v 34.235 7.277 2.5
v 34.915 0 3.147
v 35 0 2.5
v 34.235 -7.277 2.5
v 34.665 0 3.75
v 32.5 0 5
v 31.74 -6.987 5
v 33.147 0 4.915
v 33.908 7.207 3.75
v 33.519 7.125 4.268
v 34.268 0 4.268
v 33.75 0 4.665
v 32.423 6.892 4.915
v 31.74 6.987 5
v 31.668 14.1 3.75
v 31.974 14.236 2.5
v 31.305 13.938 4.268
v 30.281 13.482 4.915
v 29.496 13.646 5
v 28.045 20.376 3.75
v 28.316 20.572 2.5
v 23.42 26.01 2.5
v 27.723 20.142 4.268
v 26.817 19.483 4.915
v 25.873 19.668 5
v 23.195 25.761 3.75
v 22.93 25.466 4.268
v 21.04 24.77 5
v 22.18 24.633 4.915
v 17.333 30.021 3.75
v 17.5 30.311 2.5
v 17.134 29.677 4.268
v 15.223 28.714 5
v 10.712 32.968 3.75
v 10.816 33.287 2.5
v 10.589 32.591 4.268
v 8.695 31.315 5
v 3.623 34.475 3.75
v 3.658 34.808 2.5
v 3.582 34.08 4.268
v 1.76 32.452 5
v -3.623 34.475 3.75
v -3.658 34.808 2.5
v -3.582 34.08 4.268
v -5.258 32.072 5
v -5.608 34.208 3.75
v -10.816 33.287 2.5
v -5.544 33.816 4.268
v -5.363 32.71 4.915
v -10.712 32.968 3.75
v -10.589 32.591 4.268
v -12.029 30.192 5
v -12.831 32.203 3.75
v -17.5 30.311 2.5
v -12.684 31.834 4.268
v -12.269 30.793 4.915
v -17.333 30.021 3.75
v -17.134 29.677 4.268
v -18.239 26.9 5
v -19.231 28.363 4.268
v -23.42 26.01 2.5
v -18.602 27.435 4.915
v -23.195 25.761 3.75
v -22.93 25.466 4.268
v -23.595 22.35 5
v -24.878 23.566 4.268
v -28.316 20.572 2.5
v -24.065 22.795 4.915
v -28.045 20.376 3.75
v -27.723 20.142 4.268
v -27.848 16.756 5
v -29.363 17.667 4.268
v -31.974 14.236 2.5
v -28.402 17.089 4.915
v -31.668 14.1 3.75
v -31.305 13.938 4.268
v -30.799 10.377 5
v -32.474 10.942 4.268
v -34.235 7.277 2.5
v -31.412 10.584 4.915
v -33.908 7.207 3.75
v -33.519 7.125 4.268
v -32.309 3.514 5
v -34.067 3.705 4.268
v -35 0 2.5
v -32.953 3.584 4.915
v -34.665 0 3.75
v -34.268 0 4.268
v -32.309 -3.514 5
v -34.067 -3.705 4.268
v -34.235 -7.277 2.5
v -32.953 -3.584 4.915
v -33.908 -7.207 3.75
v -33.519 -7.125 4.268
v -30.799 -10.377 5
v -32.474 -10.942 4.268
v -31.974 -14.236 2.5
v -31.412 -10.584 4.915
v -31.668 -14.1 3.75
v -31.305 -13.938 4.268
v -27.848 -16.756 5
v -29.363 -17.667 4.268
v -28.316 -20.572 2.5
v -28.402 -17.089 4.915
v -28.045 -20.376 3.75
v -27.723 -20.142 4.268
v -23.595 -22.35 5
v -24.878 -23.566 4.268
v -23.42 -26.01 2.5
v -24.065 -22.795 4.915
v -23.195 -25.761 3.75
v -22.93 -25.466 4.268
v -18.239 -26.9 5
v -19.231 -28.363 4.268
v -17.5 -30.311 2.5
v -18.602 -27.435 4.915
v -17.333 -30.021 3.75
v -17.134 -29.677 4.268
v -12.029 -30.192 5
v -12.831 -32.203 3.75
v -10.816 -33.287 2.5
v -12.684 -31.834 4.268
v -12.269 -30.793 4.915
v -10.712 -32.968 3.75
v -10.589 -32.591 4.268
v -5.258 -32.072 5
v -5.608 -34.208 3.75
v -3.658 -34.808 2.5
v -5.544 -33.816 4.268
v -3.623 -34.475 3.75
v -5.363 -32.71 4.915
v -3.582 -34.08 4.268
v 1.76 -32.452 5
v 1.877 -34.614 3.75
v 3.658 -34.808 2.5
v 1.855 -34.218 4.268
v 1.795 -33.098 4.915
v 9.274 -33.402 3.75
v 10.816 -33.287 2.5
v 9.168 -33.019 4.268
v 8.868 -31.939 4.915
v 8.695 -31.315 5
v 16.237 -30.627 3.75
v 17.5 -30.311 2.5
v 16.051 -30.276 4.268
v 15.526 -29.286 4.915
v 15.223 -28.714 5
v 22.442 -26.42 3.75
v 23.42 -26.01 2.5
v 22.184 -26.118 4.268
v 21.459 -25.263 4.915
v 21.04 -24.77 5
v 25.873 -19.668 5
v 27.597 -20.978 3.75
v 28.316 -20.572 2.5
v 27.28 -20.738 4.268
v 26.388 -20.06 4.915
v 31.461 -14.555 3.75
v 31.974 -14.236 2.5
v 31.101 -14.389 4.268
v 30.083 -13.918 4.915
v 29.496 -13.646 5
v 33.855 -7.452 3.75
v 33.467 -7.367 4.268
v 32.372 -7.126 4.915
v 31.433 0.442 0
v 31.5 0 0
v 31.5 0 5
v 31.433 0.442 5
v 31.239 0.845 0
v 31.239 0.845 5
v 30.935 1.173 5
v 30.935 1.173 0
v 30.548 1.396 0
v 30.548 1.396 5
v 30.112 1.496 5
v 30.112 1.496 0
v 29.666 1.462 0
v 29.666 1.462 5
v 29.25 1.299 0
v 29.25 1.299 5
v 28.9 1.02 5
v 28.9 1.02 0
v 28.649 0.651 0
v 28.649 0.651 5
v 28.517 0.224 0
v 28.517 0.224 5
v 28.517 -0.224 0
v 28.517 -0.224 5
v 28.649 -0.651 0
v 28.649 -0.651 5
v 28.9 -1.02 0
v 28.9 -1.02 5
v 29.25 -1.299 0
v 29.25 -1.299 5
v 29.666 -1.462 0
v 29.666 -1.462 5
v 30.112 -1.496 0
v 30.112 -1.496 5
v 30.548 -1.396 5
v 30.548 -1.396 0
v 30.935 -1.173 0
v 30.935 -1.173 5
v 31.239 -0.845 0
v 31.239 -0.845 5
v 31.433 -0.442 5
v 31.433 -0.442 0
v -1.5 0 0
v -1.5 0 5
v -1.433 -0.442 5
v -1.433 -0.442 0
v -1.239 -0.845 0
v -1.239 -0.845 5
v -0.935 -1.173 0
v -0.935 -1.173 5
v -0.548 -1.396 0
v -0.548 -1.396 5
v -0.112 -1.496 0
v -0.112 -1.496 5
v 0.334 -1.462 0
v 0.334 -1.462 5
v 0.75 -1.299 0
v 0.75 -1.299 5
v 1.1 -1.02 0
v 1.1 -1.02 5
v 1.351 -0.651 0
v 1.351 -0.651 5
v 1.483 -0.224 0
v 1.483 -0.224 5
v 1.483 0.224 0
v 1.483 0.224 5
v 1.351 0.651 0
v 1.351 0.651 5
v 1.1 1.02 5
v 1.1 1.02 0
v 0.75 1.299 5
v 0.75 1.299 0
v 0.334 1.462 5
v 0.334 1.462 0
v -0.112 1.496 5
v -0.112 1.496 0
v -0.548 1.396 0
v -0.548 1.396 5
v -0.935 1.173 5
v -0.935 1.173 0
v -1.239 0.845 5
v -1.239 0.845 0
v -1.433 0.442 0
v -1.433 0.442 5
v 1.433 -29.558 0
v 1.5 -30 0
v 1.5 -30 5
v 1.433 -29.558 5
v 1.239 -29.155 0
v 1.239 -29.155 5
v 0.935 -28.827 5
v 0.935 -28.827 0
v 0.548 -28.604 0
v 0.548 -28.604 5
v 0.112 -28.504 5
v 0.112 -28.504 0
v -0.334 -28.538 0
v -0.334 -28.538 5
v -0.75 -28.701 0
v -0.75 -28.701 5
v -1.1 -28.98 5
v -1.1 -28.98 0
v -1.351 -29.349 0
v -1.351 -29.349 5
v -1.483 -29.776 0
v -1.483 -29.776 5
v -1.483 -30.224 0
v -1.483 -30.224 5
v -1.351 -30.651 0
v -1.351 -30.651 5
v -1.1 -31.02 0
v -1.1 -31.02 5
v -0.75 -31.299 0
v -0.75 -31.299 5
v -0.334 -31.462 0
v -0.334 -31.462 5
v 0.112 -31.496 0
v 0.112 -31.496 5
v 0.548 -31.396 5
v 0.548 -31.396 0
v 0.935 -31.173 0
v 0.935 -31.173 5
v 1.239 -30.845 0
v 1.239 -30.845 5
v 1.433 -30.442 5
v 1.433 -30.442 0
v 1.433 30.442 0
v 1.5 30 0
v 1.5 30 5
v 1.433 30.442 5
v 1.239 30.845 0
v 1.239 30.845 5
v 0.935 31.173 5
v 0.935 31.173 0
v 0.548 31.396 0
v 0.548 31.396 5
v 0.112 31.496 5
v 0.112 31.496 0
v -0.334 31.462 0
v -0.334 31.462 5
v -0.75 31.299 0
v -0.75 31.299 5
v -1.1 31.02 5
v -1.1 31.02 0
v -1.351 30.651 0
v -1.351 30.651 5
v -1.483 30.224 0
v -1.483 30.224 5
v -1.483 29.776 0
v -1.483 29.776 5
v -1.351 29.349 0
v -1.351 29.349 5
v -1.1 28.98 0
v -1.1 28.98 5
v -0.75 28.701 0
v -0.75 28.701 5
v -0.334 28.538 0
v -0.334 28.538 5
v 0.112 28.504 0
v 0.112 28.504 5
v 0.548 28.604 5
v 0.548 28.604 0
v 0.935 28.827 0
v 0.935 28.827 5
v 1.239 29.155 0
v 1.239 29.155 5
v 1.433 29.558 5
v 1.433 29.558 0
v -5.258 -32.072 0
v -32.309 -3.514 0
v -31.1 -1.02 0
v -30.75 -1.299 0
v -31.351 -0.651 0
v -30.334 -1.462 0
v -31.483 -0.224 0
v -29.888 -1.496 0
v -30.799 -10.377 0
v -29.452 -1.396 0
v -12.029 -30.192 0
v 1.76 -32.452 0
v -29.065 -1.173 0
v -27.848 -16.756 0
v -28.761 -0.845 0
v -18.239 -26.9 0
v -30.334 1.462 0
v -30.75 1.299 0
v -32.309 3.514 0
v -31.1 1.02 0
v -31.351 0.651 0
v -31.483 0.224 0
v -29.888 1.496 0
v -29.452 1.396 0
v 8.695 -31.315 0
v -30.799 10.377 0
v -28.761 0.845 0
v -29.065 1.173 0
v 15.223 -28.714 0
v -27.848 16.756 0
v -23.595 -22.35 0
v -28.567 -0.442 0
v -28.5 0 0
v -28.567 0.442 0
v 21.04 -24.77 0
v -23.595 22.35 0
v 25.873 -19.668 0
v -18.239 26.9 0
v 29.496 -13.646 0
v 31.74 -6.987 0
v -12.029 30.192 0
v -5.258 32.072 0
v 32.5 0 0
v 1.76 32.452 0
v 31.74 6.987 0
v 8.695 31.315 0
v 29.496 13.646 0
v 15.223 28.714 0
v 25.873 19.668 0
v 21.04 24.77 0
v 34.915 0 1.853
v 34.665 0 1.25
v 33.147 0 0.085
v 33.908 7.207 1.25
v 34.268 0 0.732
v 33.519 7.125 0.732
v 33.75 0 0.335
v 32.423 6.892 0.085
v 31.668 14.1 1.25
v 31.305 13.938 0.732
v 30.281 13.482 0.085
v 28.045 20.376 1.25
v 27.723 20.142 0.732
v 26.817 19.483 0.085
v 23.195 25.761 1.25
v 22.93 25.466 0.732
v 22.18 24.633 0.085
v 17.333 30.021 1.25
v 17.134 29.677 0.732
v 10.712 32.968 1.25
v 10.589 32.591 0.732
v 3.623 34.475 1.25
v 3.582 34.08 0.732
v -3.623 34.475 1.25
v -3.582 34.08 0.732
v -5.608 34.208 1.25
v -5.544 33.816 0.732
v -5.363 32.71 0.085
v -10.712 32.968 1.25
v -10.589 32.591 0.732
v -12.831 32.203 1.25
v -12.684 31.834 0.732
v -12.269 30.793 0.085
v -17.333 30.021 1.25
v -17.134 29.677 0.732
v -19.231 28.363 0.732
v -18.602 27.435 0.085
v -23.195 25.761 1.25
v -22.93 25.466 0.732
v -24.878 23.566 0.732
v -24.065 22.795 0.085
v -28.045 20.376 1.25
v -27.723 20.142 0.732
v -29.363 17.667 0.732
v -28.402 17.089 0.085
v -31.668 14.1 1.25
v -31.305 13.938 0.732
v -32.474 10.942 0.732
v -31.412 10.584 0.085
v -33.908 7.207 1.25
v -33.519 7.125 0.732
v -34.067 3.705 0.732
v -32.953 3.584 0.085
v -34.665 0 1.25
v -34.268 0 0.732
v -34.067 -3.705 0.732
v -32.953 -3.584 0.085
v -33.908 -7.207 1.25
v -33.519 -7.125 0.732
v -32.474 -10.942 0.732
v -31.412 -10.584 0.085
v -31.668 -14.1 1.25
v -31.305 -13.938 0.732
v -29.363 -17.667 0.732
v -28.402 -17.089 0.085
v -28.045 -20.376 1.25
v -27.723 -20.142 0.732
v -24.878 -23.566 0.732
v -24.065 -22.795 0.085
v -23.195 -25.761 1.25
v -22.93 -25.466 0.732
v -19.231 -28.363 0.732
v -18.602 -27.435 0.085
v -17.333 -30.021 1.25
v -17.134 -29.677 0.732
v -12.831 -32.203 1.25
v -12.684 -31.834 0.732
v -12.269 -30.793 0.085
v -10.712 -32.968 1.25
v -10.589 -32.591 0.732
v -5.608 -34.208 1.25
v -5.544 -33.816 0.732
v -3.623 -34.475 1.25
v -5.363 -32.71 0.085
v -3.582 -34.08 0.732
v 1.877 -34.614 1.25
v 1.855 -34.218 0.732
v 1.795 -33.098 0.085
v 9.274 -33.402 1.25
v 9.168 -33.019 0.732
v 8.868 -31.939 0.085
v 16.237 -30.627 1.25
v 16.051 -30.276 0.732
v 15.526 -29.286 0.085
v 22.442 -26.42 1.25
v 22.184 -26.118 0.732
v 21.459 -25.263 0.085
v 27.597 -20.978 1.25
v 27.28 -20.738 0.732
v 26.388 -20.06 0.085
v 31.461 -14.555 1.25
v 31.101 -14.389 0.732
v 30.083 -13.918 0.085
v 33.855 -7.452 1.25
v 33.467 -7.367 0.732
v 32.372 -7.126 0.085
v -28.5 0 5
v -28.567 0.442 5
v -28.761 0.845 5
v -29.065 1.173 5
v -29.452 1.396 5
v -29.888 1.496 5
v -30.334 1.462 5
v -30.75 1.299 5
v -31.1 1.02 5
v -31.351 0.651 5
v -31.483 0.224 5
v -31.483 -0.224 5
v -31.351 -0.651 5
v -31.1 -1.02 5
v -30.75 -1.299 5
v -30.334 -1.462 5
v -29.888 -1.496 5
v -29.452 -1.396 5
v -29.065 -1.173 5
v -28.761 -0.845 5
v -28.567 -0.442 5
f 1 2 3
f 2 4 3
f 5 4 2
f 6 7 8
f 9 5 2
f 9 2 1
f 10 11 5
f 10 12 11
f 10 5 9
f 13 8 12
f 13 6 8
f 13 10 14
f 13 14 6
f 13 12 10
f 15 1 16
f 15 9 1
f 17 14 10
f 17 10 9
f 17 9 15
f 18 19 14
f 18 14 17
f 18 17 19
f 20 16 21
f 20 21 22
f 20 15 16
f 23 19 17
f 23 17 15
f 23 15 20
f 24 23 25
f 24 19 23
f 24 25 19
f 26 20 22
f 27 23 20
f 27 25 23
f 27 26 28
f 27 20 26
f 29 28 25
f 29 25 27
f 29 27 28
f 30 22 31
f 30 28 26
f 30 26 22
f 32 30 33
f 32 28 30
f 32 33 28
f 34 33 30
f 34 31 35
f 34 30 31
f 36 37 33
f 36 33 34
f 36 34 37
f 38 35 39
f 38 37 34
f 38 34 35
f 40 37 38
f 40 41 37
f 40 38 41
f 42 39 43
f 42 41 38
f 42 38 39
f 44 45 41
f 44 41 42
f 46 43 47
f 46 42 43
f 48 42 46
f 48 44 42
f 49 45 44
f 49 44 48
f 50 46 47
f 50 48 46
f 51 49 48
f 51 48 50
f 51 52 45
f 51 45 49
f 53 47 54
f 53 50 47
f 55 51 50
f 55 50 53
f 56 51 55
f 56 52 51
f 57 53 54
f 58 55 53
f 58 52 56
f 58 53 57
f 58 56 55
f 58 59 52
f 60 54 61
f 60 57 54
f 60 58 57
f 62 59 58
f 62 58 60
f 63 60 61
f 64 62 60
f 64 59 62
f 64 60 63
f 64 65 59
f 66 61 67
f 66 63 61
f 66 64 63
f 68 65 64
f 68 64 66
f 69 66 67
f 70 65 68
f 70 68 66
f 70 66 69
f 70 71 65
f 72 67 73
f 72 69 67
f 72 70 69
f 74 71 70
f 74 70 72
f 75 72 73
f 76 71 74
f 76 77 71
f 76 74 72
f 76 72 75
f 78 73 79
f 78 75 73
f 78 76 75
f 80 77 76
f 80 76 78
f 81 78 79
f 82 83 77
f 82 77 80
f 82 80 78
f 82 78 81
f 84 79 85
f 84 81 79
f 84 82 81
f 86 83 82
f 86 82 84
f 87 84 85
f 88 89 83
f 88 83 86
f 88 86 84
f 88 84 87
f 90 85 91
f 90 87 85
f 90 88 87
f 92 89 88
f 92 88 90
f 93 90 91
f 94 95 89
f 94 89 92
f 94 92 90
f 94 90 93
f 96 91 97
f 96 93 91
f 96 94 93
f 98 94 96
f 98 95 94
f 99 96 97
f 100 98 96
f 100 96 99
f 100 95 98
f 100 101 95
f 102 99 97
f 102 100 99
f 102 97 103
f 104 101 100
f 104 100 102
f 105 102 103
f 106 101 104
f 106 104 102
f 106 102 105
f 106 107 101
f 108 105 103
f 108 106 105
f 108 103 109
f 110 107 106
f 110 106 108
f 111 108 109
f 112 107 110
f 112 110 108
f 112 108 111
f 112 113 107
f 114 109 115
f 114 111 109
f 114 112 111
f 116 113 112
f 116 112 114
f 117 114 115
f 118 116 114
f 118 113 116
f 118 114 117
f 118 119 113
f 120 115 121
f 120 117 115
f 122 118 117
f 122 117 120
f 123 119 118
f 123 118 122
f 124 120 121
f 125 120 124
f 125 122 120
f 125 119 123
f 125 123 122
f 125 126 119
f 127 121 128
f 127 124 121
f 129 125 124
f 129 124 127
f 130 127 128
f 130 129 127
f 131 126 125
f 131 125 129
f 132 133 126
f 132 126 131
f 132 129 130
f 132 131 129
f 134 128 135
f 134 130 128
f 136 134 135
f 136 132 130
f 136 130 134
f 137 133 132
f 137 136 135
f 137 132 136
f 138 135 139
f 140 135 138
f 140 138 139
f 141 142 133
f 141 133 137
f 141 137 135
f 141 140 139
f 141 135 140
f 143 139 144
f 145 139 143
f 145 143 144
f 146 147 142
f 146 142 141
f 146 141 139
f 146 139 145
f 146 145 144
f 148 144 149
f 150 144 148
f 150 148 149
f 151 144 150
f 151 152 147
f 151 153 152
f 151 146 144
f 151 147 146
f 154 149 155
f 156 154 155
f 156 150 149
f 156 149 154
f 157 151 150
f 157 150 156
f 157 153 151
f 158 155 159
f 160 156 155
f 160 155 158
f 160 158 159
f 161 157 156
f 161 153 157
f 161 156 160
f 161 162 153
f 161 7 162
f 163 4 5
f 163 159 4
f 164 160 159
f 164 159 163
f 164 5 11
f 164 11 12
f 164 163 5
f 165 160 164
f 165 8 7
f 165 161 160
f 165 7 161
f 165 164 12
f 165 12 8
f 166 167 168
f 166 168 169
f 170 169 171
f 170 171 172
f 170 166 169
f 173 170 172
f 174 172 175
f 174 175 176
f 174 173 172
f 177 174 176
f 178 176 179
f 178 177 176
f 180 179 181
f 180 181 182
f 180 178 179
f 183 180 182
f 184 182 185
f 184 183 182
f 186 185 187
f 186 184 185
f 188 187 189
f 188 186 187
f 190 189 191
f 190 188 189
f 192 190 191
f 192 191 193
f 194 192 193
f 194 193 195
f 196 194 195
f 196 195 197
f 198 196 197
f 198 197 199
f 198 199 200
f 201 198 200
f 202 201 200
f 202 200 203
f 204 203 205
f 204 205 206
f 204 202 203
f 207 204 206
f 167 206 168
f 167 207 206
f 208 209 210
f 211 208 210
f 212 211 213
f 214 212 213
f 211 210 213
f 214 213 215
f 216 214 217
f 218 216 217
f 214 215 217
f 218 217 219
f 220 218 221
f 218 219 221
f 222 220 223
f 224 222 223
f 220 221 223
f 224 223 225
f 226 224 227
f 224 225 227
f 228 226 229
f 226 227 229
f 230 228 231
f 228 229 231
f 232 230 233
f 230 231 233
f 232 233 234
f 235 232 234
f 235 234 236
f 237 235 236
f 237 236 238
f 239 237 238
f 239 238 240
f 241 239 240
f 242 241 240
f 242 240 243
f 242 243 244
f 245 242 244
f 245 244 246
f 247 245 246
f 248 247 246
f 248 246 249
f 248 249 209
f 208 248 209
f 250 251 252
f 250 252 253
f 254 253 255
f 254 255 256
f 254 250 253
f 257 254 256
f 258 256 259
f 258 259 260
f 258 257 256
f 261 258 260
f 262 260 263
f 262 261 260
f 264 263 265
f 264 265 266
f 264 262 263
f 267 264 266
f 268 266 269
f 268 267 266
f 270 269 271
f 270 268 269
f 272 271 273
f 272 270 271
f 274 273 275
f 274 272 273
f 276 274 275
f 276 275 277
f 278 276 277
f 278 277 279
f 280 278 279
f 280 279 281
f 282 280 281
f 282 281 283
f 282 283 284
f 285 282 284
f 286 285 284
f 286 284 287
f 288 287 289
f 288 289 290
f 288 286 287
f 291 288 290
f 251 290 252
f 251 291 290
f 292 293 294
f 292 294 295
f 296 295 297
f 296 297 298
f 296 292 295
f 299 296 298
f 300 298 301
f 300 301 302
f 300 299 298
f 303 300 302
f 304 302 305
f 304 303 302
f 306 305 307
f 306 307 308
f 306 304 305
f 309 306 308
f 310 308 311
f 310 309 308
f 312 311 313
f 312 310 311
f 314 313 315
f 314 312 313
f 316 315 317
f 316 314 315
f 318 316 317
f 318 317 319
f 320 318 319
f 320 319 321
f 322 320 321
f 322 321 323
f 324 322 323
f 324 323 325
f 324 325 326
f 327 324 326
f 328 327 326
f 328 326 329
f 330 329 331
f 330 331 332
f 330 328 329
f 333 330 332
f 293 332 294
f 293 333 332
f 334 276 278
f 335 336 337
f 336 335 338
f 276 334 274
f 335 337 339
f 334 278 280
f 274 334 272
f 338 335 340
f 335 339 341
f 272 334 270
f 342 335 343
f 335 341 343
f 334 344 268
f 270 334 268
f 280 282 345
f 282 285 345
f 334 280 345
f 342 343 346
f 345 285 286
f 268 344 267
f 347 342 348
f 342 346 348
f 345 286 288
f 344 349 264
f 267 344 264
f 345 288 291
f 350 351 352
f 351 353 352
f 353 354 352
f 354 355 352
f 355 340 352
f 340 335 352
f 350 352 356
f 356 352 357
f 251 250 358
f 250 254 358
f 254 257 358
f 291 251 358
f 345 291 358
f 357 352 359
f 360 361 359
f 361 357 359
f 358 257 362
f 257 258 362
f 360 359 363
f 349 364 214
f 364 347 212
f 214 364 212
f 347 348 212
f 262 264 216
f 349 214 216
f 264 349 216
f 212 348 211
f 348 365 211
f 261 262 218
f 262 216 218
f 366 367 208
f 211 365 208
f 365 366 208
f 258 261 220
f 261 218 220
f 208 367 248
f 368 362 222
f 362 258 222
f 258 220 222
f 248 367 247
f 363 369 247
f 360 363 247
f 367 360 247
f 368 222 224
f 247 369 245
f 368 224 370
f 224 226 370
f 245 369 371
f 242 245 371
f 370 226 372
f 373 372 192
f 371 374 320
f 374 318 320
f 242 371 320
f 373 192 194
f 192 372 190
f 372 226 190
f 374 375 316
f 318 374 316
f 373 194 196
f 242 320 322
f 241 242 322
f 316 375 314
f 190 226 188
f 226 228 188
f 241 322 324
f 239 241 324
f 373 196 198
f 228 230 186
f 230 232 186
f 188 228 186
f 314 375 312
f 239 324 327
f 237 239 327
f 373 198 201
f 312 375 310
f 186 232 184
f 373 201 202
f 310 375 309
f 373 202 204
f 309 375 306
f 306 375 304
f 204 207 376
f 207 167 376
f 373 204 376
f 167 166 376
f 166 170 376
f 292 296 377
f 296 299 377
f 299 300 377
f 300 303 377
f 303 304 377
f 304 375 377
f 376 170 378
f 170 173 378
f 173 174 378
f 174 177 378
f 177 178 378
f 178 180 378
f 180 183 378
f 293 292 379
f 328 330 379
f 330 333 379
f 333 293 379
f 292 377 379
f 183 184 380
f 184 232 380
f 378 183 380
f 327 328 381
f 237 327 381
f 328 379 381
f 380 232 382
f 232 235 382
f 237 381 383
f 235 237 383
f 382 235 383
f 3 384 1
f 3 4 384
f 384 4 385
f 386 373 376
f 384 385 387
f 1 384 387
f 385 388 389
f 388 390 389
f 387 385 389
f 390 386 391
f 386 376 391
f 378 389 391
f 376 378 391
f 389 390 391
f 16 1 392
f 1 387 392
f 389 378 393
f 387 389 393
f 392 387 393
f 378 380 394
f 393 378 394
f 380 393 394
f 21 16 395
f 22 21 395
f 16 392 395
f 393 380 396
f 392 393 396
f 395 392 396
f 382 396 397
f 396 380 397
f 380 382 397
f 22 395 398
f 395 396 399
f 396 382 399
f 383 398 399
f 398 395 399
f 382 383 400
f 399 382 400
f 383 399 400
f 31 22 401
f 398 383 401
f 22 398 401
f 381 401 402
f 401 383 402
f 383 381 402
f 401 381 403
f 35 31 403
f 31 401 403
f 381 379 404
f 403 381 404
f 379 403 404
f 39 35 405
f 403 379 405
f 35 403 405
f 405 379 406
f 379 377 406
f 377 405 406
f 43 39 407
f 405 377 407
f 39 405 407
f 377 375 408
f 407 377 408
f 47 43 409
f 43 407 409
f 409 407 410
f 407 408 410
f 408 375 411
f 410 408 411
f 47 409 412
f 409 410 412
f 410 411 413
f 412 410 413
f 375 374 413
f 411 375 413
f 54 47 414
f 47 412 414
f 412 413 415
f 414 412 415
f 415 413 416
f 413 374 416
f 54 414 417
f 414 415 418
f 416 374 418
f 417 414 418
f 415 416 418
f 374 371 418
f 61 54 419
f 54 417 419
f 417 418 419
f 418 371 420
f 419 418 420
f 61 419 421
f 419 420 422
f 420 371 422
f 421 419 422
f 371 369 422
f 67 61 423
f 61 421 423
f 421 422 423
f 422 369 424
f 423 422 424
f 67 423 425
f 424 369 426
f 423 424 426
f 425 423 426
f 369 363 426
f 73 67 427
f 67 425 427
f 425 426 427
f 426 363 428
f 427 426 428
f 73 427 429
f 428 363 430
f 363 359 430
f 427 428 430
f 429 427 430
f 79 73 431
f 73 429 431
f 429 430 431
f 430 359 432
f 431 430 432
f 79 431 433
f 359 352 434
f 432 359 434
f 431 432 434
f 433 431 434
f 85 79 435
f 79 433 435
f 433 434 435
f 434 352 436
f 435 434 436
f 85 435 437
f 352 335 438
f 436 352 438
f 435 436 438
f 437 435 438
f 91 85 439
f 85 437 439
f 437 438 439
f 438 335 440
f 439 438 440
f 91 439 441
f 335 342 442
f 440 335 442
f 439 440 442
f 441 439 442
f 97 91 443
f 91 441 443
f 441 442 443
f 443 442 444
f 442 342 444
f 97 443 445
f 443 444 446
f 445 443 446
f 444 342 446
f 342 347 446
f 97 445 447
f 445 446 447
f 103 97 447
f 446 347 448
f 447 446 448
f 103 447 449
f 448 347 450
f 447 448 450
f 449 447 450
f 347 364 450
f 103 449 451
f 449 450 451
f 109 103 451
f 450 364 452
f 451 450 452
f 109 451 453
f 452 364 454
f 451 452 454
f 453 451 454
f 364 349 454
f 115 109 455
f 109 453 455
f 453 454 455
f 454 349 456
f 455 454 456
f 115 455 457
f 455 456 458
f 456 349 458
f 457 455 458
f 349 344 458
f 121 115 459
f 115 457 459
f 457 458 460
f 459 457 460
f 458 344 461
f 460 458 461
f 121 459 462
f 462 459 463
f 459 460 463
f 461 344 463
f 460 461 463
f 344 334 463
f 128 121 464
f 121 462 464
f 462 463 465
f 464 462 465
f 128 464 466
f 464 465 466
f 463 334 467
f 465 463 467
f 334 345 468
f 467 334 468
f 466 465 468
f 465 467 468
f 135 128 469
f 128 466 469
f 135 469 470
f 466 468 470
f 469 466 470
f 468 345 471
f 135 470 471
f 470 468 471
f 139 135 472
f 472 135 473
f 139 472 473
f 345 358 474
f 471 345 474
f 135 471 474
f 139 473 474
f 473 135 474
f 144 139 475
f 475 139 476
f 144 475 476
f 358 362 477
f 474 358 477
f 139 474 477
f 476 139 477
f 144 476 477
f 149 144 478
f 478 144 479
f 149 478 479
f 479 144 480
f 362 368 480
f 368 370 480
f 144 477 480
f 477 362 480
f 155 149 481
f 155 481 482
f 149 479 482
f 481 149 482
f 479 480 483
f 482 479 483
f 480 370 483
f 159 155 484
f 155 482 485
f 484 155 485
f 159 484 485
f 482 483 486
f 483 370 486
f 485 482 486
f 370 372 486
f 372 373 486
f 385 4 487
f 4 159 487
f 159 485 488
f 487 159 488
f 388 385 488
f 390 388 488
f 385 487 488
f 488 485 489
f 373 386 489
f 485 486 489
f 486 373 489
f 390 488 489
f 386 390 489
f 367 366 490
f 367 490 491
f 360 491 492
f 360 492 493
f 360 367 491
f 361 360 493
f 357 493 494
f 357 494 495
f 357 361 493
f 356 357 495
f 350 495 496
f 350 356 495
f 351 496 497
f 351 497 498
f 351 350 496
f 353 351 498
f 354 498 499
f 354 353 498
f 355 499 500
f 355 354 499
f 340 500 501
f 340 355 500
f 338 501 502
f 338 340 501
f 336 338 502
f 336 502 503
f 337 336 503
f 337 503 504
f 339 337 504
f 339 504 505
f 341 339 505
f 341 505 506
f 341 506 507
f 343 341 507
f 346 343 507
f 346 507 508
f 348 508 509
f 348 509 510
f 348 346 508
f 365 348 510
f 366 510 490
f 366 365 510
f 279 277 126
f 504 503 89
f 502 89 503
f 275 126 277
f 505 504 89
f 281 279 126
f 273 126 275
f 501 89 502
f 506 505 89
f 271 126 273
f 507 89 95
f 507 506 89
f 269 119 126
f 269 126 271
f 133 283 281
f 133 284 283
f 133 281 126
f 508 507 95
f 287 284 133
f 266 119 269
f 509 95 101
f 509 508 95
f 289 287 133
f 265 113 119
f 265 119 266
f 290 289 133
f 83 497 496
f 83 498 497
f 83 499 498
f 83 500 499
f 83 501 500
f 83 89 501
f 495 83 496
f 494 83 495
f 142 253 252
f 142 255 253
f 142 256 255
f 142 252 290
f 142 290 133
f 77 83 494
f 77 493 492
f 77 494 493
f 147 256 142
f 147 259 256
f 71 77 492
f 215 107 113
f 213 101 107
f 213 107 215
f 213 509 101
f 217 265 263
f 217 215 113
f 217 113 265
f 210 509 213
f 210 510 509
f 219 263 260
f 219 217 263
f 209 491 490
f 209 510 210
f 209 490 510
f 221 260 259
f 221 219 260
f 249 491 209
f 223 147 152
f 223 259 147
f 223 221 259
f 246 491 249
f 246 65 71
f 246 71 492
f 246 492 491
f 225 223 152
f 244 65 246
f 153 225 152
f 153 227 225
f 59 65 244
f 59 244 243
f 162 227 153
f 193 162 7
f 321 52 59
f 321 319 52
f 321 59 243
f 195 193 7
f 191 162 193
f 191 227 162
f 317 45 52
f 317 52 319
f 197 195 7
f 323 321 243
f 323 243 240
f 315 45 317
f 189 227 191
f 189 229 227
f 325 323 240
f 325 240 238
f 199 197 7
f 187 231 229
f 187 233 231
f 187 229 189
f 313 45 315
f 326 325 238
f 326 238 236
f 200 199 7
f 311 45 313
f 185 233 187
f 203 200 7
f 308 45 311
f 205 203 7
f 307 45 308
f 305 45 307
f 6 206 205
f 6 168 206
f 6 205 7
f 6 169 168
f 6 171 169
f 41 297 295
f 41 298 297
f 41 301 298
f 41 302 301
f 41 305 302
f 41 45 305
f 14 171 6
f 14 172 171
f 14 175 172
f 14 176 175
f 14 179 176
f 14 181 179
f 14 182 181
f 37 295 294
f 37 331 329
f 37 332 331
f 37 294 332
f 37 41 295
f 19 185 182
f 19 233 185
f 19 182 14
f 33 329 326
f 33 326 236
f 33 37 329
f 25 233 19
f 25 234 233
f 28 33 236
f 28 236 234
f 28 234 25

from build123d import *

# Parameters (mm, degrees)
F0_R     = 35
F0_R_2   = 1.5
F1_DEPTH = 5
F2_R     = 2.49999
F3_D     = 3


# Not quite as in the source:
# - a fillet or chamfer is up to 0.001 mm smaller than in the source, because OpenCascade refuses the exact size


with BuildPart() as f1:
    # F0 (on Top) → F1 (new body)
    with BuildSketch(Plane.XY):
        Circle(F0_R)
        with Locations((0, -30)):
            Circle(F0_R_2, mode=Mode.SUBTRACT)
        with Locations((-30, 0)):
            Circle(F0_R_2, mode=Mode.SUBTRACT)
        with Locations((30, 0)):
            Circle(F0_R_2, mode=Mode.SUBTRACT)
        with Locations((0, 30)):
            Circle(F0_R_2, mode=Mode.SUBTRACT)
    extrude(amount=F1_DEPTH)

    # F2 (radius 2.5 in the source; OpenCascade refuses exactly that, so slightly less here)
    f2_edges = [f1.edges().sort_by_distance(p)[0] for p in [
        (-35, 0, 5),
        (-35, 0, 0),
    ]]
    fillet(f2_edges, radius=F2_R)

    # F3 (through all)
    with Locations(Plane(origin=(0, 0, 0), x_dir=(1, 0, 0), z_dir=(0, 0, -1))):
        with Locations((0, 0)):
            Hole(F3_D / 2)


solid = f1.part
